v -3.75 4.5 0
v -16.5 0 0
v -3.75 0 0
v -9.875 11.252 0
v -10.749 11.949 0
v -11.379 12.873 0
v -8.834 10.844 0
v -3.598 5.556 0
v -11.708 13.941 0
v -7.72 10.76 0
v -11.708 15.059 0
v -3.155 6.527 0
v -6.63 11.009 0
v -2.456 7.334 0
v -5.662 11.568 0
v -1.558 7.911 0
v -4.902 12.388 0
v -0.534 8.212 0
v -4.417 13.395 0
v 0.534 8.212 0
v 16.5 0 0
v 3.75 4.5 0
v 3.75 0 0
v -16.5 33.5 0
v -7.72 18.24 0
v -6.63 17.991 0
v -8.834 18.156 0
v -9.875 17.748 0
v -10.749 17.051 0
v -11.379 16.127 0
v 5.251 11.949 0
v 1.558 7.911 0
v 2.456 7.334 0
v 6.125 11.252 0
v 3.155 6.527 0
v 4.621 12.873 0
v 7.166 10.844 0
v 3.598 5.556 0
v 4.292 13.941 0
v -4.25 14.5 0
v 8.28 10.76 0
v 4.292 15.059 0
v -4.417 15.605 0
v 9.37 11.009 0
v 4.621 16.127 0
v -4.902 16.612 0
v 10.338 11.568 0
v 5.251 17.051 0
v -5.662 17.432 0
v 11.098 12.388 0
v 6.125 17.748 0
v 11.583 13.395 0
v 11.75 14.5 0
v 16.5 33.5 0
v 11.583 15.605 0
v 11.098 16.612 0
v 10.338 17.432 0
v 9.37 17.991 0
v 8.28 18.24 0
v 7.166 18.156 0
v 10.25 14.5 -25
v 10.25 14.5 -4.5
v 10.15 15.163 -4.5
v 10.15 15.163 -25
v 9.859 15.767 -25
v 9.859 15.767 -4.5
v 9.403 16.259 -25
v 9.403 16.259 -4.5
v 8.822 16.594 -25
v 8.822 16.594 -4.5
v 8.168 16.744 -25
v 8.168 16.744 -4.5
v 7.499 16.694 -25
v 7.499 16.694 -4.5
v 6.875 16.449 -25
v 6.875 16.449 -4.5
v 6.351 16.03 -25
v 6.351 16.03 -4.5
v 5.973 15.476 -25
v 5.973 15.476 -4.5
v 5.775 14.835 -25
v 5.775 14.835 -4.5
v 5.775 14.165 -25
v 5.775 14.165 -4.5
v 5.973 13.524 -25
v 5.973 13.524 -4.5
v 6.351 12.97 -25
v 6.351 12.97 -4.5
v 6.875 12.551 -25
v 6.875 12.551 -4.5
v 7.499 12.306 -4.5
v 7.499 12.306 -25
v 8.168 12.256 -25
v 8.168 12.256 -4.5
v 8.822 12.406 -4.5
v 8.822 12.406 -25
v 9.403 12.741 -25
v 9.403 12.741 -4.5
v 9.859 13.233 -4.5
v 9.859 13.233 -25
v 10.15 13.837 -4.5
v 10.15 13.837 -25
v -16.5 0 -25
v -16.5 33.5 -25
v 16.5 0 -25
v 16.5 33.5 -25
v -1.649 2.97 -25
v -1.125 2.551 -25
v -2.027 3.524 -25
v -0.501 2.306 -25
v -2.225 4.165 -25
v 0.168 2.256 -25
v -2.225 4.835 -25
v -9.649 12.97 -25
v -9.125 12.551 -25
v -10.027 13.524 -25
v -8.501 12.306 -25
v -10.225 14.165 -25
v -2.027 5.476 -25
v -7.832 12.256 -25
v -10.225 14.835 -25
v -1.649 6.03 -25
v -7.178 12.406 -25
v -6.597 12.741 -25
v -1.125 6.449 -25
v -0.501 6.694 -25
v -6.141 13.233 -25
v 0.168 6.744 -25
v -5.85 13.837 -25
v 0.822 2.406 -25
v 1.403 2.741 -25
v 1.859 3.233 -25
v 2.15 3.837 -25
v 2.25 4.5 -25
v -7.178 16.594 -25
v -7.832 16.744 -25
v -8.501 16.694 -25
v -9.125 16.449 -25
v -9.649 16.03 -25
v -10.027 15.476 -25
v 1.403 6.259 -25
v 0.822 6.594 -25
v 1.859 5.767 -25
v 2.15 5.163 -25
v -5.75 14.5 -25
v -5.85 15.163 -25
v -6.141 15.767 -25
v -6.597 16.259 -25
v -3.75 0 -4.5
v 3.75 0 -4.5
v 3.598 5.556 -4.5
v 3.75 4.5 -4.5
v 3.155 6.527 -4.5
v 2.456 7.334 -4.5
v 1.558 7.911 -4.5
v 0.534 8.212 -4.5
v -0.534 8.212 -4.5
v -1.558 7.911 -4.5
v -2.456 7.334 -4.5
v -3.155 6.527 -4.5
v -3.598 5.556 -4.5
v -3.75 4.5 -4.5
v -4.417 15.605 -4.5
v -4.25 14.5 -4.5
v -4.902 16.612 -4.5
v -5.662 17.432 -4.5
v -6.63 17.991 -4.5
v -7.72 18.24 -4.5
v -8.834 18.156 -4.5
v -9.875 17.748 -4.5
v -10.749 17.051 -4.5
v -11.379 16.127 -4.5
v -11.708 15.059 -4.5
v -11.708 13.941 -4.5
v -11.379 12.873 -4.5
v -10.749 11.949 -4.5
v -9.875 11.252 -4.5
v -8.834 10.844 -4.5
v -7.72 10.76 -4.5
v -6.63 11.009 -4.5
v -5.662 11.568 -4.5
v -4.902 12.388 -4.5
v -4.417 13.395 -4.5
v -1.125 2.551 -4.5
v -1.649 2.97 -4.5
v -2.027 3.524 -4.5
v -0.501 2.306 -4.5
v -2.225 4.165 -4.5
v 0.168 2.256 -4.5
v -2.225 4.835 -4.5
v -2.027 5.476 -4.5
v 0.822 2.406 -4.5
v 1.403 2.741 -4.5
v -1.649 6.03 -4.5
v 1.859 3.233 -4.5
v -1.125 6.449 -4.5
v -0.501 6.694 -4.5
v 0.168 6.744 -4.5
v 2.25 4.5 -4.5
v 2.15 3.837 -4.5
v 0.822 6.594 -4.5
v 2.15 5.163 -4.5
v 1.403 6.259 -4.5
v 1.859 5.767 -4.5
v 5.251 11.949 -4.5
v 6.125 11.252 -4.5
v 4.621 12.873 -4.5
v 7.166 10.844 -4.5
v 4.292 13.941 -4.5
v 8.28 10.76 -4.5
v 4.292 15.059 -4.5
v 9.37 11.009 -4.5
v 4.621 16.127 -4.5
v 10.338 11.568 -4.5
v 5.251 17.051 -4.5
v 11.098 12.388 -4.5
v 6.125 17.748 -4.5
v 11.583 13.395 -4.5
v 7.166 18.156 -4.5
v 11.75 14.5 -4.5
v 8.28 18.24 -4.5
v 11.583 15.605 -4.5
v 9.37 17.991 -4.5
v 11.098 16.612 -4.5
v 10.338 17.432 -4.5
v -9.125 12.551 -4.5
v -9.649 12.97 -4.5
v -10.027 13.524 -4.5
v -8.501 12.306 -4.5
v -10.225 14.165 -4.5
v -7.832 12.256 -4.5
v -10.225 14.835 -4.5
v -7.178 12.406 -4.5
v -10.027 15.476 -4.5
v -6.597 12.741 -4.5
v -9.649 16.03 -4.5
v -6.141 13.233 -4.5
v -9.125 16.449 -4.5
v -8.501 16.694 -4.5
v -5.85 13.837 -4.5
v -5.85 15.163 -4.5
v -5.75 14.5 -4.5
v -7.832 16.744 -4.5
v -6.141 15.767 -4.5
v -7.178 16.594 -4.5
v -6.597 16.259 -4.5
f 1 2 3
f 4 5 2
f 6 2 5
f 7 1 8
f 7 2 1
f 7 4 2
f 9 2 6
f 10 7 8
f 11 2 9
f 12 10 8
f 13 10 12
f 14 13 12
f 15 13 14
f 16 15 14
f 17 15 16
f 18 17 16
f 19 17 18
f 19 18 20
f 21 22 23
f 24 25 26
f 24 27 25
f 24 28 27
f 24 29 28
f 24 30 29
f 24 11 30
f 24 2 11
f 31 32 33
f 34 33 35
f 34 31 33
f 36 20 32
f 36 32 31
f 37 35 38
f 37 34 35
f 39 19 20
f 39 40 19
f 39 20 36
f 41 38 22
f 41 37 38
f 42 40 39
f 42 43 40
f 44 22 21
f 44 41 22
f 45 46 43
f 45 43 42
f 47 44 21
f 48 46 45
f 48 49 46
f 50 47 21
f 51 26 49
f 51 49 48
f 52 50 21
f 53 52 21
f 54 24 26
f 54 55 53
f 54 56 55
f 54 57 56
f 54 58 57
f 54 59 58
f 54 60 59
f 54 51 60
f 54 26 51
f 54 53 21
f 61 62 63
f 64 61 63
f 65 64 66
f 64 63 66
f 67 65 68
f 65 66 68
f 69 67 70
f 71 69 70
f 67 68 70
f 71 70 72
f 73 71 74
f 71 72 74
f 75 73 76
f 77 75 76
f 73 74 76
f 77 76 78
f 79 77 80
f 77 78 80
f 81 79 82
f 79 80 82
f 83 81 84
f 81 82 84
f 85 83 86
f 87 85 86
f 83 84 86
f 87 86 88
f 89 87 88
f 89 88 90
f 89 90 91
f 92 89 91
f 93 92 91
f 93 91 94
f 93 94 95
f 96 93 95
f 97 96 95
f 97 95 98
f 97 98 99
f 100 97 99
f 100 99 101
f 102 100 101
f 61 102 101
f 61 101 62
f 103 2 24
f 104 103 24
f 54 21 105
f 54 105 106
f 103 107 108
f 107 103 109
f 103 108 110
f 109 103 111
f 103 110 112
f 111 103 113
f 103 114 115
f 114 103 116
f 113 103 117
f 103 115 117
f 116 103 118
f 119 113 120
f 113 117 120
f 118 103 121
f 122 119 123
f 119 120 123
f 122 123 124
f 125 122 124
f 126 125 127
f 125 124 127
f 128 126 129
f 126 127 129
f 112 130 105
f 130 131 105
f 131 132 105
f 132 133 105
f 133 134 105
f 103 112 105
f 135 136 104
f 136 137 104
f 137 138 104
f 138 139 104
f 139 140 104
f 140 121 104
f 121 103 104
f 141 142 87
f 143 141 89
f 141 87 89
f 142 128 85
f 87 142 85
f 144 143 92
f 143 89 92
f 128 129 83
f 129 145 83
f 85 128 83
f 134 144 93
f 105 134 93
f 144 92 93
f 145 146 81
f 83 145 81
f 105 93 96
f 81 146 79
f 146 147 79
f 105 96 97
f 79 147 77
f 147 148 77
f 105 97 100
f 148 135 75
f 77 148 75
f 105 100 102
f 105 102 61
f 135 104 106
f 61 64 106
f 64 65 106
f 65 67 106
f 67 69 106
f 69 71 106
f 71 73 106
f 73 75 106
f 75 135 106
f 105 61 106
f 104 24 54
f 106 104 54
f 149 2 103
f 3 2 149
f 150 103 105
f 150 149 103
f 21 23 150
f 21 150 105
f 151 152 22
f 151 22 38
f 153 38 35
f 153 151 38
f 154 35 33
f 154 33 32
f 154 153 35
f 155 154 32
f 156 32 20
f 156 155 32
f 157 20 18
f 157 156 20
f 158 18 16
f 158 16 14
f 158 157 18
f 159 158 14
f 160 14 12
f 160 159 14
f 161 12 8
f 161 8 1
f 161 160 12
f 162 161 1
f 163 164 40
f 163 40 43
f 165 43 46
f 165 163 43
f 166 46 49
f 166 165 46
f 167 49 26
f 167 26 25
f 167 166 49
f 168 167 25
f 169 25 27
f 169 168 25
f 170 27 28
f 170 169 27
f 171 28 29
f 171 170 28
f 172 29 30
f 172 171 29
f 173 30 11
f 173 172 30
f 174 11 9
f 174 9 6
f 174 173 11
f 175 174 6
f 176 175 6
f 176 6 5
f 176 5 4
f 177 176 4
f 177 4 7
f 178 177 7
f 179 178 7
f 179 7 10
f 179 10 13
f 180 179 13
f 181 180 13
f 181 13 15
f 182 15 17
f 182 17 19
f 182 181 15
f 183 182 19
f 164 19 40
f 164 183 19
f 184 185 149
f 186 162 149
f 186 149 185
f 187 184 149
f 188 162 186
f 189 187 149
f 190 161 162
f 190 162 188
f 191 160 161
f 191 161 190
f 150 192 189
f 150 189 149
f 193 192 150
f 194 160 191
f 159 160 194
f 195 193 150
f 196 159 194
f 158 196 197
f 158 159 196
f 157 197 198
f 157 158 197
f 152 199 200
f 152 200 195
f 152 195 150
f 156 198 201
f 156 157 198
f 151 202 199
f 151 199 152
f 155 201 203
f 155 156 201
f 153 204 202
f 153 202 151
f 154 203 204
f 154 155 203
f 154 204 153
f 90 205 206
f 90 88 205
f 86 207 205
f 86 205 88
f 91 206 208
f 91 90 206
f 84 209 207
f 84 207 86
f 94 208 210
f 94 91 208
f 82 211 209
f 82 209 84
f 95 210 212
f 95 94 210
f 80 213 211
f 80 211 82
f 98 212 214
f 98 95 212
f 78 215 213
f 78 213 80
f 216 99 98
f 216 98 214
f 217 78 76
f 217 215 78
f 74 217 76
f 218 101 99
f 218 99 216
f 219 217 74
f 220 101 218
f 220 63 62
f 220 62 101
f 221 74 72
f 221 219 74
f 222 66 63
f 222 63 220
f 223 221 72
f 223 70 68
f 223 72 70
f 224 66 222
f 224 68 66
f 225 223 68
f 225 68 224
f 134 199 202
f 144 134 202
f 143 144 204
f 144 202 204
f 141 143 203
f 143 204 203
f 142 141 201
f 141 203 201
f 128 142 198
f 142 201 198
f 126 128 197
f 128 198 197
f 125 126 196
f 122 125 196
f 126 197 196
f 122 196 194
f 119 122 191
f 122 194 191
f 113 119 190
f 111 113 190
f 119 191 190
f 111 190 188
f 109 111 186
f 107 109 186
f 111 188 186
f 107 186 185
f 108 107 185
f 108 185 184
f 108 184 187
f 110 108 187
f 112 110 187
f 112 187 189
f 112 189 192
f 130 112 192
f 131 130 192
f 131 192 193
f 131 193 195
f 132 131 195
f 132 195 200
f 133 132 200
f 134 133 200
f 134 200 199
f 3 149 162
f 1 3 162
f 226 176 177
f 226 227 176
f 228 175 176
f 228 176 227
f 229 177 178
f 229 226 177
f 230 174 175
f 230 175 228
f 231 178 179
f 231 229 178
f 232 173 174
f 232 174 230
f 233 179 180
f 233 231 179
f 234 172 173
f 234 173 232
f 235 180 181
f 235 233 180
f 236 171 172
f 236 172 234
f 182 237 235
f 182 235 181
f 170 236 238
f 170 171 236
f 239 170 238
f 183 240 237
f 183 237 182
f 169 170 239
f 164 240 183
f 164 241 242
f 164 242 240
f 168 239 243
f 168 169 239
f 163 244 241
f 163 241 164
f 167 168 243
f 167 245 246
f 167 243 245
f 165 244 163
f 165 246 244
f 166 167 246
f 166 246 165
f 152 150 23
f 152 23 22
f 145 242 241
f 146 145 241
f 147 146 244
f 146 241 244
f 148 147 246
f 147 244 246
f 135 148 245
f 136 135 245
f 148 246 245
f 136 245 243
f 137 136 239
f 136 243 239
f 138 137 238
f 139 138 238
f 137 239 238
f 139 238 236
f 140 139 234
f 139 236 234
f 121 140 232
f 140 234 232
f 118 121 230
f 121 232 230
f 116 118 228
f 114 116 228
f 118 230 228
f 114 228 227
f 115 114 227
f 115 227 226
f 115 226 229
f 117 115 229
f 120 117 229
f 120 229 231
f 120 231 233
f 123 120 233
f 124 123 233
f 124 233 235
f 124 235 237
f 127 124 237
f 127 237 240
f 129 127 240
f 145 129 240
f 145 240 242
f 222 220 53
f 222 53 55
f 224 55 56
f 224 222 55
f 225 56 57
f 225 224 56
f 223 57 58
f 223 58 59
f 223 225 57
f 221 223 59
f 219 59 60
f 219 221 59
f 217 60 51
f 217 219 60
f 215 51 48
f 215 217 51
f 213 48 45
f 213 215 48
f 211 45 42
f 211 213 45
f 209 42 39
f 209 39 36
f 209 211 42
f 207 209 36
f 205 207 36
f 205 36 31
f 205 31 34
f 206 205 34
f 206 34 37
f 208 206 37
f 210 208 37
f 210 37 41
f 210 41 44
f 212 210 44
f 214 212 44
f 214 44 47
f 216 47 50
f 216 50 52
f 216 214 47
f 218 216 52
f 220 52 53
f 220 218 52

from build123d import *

# Parameters (mm, degrees)
BASE_SKETCH_W   = 33
BASE_SKETCH_H   = 33.5
BASE_DEPTH      = 25
DRILL_SKETCH_R  = 2.25
DRILL_DEPTH     = 45.938847337
MILL_START      = -4.5
MILL_SKETCH_W   = 7.5
MILL_SKETCH_H   = 4.5
MILL_DEPTH      = 4.5
C_BORE_START    = -4.5
C_BORE_SKETCH_R = 3.75
C_BORE_DEPTH    = 4.5


with BuildPart() as part:
    # Base_Sketch → Base (new body)
    with BuildSketch(Plane.XY):
        with Locations((0, 16.75)):
            Rectangle(BASE_SKETCH_W, BASE_SKETCH_H)
    extrude(amount=-BASE_DEPTH)

    # Drill_Sketch → Drill (cut, through all)
    with BuildSketch(Plane.XY):
        with Locations((0, 4.5)):
            Circle(DRILL_SKETCH_R)
        with Locations((-8, 14.5)):
            Circle(DRILL_SKETCH_R)
        with Locations((8, 14.5)):
            Circle(DRILL_SKETCH_R)
    extrude(amount=-DRILL_DEPTH, mode=Mode.SUBTRACT)

    # Mill_Sketch → Mill (cut)
    with BuildSketch(Plane.XY.offset(MILL_START)):
        with Locations((0, 2.25)):
            Rectangle(MILL_SKETCH_W, MILL_SKETCH_H)
    extrude(amount=MILL_DEPTH, mode=Mode.SUBTRACT)

    # C_Bore_Sketch → C_Bore (cut)
    with BuildSketch(Plane.XY.offset(C_BORE_START)):
        with Locations((-8, 14.5)):
            Circle(C_BORE_SKETCH_R)
        with Locations((8, 14.5)):
            Circle(C_BORE_SKETCH_R)
        with Locations((0, 4.5)):
            Circle(C_BORE_SKETCH_R)
    extrude(amount=C_BORE_DEPTH, mode=Mode.SUBTRACT)


solid = part.part
